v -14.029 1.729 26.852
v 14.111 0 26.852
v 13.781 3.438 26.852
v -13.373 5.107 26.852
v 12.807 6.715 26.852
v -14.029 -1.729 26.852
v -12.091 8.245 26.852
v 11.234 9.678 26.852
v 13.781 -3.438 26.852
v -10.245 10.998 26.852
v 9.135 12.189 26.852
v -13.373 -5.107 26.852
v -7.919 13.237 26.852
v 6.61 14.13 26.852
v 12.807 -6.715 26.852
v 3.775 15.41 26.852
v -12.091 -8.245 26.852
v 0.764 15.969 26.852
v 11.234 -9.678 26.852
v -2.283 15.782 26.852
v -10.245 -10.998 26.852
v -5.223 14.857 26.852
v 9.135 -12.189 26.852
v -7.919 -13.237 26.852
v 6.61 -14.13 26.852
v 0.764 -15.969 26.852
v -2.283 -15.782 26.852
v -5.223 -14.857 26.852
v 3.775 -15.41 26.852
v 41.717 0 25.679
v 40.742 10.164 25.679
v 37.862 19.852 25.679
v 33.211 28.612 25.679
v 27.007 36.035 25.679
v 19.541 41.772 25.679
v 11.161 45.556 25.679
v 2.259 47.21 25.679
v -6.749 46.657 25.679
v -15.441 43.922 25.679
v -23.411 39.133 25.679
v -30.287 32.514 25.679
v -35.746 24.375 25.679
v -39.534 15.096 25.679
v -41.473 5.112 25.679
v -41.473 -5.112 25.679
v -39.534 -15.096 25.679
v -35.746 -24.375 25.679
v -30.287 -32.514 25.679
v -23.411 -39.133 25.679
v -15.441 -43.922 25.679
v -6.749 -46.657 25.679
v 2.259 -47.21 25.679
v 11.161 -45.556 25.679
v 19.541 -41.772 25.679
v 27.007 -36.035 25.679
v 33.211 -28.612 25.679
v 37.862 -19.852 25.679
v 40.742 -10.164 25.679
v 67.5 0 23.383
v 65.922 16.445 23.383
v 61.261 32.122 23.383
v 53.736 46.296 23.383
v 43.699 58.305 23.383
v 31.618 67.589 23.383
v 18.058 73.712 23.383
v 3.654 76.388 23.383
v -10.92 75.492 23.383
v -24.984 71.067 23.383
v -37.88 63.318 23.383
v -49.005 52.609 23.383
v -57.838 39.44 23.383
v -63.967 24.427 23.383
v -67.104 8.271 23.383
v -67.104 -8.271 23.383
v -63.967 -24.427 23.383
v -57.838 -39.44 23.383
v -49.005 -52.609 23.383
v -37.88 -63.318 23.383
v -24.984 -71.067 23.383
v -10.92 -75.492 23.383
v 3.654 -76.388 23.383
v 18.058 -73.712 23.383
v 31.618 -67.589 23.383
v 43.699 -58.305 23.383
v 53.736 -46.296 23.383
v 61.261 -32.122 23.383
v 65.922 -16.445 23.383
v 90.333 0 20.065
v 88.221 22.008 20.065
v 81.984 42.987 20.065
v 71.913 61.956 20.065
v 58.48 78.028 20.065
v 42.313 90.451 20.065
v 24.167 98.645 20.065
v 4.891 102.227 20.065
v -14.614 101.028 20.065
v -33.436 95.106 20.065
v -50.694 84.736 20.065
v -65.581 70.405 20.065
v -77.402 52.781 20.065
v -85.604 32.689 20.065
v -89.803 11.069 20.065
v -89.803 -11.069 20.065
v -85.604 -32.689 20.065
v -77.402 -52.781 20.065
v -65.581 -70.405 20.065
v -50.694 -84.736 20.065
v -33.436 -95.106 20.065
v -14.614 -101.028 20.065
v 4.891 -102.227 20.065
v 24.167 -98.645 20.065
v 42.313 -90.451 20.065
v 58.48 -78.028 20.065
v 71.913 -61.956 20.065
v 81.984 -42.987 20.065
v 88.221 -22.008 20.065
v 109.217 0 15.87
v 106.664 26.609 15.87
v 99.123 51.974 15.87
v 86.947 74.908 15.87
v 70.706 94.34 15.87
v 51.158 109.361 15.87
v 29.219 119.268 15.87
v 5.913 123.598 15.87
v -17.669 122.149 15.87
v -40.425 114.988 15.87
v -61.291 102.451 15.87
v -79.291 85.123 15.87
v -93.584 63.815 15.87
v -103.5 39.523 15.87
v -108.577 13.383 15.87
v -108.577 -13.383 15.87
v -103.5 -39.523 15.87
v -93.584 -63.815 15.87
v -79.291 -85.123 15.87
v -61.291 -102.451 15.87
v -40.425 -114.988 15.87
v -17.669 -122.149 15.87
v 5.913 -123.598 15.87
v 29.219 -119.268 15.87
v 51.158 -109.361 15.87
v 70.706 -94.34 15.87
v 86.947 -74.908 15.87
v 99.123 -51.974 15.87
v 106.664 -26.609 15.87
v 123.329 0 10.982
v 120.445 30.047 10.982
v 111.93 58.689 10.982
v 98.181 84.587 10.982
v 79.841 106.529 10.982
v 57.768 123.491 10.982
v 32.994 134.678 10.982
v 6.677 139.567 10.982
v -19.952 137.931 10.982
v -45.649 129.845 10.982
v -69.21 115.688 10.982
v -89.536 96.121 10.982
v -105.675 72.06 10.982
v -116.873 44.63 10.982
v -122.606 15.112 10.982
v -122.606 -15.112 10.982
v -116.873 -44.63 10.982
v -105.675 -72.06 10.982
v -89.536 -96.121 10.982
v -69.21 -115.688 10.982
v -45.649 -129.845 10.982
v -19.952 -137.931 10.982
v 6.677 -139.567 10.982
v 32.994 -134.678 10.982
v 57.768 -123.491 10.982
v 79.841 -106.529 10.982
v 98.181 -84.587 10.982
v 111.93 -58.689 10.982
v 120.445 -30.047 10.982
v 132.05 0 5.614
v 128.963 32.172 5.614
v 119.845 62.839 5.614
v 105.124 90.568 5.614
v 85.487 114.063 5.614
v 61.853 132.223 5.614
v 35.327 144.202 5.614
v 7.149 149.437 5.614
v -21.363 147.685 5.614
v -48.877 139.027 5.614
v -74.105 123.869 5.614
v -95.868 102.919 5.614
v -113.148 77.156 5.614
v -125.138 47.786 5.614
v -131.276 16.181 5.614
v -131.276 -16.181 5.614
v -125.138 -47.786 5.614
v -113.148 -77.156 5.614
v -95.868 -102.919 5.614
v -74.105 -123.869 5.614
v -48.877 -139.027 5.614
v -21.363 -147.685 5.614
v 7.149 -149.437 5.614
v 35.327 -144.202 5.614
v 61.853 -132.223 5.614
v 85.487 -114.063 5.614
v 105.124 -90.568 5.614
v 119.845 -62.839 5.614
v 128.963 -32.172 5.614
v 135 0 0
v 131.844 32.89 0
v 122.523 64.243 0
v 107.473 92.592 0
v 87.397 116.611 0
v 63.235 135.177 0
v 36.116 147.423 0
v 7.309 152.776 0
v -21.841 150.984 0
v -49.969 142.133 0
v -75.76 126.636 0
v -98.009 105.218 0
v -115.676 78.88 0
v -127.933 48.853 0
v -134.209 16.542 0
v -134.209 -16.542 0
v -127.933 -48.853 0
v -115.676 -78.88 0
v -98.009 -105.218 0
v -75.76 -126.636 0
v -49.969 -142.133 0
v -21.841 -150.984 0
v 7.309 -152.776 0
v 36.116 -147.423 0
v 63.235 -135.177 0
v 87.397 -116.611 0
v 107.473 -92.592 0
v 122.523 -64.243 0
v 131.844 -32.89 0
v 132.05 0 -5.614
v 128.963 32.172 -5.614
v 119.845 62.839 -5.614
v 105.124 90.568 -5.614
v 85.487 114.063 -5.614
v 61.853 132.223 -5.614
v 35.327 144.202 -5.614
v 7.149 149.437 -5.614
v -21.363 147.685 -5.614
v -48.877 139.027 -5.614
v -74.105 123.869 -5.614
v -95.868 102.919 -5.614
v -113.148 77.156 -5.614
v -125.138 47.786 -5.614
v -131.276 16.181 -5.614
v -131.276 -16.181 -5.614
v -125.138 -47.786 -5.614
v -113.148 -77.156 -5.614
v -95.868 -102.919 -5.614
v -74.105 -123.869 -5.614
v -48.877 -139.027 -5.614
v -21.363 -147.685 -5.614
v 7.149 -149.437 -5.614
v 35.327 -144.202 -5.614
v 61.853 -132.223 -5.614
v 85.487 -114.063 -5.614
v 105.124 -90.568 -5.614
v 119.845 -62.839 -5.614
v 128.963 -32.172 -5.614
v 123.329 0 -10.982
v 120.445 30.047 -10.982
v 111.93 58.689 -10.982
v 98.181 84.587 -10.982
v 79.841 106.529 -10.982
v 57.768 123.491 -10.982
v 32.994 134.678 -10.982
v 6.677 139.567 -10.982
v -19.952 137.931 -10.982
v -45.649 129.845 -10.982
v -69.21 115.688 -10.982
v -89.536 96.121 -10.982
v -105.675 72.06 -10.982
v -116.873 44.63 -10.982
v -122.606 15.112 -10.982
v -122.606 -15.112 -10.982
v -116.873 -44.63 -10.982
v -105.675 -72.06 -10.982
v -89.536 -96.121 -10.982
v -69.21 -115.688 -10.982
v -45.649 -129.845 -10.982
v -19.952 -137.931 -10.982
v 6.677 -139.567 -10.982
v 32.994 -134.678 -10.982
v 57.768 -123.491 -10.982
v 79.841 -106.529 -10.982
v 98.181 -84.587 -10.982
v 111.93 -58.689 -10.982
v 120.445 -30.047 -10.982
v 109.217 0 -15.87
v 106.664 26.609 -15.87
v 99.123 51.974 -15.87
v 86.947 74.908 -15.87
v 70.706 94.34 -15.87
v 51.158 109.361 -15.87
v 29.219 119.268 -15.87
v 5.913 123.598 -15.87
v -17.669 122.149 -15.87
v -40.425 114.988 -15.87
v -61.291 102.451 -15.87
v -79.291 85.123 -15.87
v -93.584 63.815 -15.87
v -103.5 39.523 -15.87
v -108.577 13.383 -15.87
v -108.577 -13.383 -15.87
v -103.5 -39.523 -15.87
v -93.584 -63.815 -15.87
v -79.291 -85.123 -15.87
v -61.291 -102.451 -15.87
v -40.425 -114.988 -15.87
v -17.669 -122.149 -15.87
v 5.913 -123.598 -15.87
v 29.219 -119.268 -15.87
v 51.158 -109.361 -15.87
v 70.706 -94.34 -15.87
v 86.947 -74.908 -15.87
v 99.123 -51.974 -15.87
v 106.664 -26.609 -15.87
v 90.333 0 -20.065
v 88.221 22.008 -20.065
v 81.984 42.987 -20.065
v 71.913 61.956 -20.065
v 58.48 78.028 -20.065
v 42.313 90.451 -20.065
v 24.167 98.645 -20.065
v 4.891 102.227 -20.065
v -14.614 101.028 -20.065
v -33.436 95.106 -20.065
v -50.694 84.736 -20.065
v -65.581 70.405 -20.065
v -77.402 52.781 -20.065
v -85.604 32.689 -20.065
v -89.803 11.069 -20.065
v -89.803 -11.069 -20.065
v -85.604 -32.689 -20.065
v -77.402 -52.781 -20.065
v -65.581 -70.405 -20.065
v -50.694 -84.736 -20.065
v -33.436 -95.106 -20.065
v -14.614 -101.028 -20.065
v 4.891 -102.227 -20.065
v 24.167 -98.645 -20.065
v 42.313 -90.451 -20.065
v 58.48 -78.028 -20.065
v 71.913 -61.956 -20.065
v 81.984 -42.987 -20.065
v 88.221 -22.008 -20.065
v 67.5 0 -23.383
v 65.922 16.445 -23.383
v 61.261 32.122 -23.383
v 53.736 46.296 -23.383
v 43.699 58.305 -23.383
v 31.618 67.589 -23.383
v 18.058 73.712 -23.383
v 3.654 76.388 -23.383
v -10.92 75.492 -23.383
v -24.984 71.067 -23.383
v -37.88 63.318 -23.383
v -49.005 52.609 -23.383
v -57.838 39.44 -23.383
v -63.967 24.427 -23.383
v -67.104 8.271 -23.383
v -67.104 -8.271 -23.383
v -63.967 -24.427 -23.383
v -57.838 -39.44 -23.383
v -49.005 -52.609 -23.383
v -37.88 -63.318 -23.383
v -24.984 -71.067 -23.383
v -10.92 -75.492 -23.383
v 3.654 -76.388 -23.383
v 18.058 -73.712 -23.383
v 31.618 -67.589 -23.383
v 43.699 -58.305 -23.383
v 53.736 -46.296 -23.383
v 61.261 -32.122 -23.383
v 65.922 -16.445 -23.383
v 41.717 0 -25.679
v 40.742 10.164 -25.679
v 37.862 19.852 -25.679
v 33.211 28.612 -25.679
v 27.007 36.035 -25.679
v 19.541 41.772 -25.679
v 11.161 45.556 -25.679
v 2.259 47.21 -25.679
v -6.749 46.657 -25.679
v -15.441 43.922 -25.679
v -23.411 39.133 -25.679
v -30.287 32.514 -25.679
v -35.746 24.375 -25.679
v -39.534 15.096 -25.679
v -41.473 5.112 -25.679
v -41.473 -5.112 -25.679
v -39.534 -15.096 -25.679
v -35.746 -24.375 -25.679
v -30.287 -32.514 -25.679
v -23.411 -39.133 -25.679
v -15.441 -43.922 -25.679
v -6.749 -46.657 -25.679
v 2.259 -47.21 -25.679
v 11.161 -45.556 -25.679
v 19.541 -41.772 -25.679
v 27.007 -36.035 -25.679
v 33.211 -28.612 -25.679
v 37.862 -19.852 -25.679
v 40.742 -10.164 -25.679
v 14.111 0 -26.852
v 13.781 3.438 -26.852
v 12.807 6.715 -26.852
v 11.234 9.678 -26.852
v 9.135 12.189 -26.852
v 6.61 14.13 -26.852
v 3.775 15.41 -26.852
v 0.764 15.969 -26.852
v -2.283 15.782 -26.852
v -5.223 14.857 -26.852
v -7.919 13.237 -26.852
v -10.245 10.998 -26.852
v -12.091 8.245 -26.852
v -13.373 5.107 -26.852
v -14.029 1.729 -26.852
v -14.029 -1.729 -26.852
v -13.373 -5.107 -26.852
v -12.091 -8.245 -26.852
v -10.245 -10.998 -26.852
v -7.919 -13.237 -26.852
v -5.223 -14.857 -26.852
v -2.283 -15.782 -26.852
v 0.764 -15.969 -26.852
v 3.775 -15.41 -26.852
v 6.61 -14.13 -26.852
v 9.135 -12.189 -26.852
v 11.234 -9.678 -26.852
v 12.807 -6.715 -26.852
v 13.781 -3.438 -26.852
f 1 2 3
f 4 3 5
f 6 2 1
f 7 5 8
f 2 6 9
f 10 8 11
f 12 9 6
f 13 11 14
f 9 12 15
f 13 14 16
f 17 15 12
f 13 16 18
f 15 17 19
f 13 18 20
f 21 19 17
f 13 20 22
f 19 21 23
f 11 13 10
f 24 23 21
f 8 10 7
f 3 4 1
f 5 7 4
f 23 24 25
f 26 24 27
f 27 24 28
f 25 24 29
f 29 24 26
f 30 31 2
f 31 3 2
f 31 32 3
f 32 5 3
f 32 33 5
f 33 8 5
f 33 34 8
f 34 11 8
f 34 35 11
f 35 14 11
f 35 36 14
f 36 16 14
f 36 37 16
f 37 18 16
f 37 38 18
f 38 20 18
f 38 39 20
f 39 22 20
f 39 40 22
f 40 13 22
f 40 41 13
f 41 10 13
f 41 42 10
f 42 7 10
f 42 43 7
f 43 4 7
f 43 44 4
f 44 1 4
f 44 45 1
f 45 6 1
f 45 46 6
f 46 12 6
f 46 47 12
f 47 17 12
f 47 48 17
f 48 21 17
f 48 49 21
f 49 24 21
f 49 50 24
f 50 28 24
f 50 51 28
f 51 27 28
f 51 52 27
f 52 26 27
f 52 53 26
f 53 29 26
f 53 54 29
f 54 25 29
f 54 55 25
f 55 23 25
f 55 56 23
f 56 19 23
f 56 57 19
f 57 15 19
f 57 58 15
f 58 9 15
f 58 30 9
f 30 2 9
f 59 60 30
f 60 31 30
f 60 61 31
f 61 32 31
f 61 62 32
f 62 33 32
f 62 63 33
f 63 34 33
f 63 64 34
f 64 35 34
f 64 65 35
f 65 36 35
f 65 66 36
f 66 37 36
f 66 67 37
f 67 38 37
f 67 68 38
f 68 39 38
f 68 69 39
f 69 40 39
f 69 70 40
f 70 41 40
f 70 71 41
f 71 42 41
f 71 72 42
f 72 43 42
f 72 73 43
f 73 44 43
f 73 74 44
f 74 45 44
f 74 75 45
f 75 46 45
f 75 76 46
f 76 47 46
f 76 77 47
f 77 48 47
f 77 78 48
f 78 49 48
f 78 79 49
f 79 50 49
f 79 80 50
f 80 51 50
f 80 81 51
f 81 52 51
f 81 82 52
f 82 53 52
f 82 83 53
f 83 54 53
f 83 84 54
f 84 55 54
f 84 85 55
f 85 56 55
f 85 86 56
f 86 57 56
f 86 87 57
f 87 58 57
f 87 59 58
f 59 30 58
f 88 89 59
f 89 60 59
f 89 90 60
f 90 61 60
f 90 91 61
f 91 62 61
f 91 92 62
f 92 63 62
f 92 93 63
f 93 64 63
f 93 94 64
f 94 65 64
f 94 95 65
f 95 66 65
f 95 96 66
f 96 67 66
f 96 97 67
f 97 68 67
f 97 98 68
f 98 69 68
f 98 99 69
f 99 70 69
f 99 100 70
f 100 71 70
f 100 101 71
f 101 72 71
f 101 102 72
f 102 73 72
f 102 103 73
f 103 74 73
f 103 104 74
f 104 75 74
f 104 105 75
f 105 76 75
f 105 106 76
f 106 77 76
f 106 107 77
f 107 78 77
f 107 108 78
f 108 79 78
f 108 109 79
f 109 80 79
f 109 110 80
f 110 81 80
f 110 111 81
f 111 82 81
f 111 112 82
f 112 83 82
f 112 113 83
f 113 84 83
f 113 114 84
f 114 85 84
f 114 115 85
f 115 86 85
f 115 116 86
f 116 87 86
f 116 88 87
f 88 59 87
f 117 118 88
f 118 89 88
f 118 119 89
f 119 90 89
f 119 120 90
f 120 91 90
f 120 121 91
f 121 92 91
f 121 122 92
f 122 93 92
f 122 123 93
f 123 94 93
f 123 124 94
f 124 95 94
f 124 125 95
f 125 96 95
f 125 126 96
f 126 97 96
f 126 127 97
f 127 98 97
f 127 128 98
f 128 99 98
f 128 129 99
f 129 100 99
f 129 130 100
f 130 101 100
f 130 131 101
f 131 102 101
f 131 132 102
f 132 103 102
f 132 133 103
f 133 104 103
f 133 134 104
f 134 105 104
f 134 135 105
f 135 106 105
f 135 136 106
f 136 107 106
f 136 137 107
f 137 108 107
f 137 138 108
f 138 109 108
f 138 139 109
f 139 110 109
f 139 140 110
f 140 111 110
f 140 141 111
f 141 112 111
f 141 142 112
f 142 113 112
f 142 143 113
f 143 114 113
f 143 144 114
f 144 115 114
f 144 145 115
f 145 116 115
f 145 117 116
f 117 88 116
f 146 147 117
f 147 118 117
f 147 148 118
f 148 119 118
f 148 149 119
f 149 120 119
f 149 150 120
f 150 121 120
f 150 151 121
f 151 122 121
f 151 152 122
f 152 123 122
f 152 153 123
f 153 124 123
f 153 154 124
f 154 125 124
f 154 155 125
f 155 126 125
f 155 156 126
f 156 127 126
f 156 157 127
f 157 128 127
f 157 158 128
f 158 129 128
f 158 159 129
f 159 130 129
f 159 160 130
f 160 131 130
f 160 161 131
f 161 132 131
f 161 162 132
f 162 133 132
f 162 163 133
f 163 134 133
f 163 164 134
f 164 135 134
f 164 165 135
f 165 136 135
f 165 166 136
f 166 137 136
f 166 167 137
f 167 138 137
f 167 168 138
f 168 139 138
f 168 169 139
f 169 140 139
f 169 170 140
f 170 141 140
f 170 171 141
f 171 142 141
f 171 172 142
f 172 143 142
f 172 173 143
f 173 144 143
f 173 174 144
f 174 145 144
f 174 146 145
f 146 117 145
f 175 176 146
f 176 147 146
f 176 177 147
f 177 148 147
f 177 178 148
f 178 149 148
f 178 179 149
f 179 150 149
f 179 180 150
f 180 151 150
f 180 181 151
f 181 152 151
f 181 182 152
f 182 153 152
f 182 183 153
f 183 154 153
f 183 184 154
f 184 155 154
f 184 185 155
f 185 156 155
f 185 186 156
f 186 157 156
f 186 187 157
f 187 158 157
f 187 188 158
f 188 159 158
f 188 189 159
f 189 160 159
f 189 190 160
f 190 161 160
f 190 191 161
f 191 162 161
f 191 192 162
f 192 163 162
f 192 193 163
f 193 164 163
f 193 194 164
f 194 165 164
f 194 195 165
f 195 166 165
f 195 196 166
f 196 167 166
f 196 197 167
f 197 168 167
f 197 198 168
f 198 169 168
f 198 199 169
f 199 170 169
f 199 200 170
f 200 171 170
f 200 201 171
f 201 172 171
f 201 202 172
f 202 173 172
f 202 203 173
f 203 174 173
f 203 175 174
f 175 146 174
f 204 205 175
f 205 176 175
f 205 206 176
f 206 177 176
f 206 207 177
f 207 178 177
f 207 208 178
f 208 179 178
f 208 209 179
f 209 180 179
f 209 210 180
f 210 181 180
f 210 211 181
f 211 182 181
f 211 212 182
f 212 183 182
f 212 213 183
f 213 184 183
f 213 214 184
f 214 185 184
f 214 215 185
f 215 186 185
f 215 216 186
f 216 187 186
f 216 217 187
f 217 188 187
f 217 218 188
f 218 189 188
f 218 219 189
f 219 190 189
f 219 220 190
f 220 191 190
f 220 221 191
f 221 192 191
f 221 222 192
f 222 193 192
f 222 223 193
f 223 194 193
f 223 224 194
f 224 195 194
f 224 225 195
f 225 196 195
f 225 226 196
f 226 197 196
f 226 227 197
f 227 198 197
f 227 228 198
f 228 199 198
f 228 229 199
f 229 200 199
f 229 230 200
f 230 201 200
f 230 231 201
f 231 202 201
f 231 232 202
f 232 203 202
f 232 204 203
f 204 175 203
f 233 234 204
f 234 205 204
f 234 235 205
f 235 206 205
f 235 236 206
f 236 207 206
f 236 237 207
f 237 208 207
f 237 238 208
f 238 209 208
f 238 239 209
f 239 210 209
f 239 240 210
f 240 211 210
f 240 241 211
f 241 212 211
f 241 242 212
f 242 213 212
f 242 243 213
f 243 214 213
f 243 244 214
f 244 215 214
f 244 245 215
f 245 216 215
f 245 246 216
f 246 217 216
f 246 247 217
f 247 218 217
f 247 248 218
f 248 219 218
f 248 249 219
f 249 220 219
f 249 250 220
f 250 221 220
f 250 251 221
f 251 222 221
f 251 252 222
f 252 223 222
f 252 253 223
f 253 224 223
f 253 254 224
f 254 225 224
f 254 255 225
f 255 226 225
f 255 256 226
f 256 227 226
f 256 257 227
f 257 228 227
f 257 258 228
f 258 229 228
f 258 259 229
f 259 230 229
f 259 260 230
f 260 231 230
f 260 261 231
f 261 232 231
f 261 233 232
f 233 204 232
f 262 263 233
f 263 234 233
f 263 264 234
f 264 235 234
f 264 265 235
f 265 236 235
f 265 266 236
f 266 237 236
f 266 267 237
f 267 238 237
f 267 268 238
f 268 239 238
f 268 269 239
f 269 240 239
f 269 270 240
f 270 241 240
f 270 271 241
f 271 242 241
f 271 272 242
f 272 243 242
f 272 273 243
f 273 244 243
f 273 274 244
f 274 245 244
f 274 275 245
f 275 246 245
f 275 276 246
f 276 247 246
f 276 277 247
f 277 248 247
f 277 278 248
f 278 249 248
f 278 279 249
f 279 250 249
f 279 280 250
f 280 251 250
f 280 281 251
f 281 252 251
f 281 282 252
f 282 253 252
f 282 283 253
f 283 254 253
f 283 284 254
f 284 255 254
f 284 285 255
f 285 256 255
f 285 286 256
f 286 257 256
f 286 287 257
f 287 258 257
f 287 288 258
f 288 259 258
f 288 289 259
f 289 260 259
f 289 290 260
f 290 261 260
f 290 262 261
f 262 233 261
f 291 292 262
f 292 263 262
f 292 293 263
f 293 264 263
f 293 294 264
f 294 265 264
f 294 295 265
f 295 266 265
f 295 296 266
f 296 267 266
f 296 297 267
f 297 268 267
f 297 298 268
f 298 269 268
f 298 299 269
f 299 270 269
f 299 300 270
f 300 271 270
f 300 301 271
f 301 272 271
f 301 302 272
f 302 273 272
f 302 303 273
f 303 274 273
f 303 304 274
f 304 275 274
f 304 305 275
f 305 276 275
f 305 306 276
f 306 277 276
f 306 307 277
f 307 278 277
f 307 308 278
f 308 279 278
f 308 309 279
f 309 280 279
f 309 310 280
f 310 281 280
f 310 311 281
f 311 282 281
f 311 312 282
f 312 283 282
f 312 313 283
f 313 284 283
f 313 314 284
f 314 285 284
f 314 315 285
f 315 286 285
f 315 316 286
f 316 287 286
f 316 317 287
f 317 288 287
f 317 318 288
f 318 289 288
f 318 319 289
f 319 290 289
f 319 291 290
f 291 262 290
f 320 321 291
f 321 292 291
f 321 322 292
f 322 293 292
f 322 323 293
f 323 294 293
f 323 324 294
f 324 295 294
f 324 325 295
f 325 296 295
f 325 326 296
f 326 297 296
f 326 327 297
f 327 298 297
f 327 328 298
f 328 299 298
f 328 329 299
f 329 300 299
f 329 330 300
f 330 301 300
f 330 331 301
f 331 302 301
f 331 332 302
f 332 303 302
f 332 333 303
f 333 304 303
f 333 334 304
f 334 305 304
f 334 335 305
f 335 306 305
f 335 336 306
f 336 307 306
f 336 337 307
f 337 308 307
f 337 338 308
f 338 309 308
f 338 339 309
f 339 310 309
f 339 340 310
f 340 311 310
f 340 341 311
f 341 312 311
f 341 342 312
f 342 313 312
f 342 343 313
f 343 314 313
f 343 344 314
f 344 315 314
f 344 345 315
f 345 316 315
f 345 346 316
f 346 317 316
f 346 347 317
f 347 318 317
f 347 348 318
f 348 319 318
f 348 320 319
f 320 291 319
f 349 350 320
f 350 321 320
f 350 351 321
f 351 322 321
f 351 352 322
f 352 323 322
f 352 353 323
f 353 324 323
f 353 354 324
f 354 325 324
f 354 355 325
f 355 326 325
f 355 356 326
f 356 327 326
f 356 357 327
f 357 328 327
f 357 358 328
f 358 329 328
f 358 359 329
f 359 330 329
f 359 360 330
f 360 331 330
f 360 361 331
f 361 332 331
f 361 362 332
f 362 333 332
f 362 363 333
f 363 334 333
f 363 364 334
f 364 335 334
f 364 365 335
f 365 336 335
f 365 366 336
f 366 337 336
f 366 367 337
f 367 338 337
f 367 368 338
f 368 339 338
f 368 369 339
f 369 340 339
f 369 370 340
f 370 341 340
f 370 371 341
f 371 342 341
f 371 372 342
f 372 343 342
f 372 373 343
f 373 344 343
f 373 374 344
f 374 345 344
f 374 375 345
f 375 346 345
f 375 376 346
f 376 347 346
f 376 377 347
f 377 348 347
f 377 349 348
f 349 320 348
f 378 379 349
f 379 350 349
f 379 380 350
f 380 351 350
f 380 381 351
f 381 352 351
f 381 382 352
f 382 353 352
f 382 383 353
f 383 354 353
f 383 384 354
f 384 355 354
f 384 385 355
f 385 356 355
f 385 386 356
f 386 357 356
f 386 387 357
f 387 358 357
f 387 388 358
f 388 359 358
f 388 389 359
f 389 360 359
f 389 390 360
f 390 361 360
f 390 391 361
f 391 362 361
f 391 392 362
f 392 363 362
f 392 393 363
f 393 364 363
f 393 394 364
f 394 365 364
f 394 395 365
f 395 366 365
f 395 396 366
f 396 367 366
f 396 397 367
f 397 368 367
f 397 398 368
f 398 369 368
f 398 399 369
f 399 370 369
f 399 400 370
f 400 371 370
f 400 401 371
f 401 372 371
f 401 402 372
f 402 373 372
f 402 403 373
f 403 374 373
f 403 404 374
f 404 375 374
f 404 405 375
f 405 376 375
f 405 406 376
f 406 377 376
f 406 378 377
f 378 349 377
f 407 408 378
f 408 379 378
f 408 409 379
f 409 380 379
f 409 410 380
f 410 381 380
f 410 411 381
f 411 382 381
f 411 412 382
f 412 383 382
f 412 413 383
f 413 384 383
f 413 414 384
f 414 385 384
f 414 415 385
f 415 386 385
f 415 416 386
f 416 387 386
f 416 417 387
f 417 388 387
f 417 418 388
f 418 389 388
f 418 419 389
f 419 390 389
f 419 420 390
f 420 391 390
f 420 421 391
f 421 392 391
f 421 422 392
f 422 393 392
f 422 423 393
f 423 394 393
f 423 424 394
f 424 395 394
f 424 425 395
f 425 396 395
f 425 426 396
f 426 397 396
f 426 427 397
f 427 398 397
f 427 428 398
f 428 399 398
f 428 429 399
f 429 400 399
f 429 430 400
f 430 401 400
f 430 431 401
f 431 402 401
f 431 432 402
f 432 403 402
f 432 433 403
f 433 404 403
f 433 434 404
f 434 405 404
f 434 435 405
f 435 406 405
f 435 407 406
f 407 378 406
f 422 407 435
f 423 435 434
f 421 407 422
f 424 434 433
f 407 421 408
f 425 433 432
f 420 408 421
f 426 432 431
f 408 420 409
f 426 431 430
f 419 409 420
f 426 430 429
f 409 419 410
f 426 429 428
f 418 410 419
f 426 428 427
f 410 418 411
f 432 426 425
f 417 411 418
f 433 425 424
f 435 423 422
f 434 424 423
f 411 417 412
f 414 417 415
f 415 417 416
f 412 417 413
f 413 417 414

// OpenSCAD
// Generated by SolidPython 1.0.1 on 2020-07-29 00:46:52


scale(v = [15, 17, 3]) {
	sphere(r = 9);
}
/***********************************************
*********      SolidPython code:      **********
************************************************
 
# import packages: SolidPython
from solid import *
from solid.utils import *
from itertools import chain, combinations, permutations


class Resize:

    def __init__(self, scad_file):
        self.scad_file = scad_file
        #self.scad_file = import_scad(scad_file)
        # cone/cylinder param:
        self.r1 = 0
        self.r2 = 0
        self.h = 0
        # rectangular prism param:
        self.w = 0
        self.l = 0
        # ellipse param:
        self.r = 0

    # import OpenScad code (file name corresponds to shape)


    # classify shape + parameters
    def assign(self, param1, param2, param3):
        if self.scad_file == 'cone.scad':
            self.r1 = param1
            self.r2 = param2
            self.h = param3
        elif self.scad_file == 'cylinder.scad':
            self.r1 = param1
            self.r2 = param2
            self.h = param3
        elif self.scad_file == 'rectangularPrism.scad':
            self.h = param1
            self.l = param2
            self.w = param3
        else:
            self.r = param1
            self.h = param2

    # resize parameters
    def iterate(self):
        x = range(3, 20, 2)
        i = 1
        if self.scad_file == 'cone.scad':
            tempList = list(permutations(x, 2))
            for temp in tempList:
                param1 = temp[0]
                param2 = temp[1]
                filepath = 'produced_scad_files/' + 'cone' + str(param1) + '_' + str(param2) + '_' + '.scad'
                scad_render_to_file(cylinder(h=param1, r1=param2, r2=0), filepath)

        elif self.scad_file == 'cylinder.scad':
            tempList = list(permutations(x, 3))
            for temp in tempList:
                param1 = temp[0]
                param2 = temp[1]
                filepath = 'produced_scad_files/' + 'cylinder' + str(param1) + '_' + str(param2) + '_' + '.scad'
                scad_render_to_file(cylinder(h=param1, r1=param2, r2=param2), filepath)

        elif self.scad_file == 'rectangularPrism.scad':
            tempList = list(permutations(x, 3))
            for temp in tempList:
                param1 = temp[0]
                param2 = temp[1]
                param3 = temp[2]
                filepath = 'produced_scad_files/' + 'rectangularPrism' + str(param1) + '_' + str(param2) + '_' + str(
                    param3) + '.scad'
                scad_render_to_file(cube(size=(param1, param2, param3)), filepath)

        elif self.scad_file == 'ellipse.scad':
            tempList = list(permutations(x, 4))
            for temp in tempList:
                param1 = temp[0]
                param2 = temp[1]
                param3 = temp[2]
                param4 = temp[3]
                filepath = 'produced_scad_files/' + 'ellipse' + str(param1) + '_' + str(param2) + '_' + str(param3) + '_' + str(param4) + '.scad'
                scad_render_to_file(scale([param1, param2, param3])(sphere(r=param4)), filepath)

    def render_to_scadfile(self):
        scad_render_to_file(scad, 'example.scad') 
 
************************************************/
